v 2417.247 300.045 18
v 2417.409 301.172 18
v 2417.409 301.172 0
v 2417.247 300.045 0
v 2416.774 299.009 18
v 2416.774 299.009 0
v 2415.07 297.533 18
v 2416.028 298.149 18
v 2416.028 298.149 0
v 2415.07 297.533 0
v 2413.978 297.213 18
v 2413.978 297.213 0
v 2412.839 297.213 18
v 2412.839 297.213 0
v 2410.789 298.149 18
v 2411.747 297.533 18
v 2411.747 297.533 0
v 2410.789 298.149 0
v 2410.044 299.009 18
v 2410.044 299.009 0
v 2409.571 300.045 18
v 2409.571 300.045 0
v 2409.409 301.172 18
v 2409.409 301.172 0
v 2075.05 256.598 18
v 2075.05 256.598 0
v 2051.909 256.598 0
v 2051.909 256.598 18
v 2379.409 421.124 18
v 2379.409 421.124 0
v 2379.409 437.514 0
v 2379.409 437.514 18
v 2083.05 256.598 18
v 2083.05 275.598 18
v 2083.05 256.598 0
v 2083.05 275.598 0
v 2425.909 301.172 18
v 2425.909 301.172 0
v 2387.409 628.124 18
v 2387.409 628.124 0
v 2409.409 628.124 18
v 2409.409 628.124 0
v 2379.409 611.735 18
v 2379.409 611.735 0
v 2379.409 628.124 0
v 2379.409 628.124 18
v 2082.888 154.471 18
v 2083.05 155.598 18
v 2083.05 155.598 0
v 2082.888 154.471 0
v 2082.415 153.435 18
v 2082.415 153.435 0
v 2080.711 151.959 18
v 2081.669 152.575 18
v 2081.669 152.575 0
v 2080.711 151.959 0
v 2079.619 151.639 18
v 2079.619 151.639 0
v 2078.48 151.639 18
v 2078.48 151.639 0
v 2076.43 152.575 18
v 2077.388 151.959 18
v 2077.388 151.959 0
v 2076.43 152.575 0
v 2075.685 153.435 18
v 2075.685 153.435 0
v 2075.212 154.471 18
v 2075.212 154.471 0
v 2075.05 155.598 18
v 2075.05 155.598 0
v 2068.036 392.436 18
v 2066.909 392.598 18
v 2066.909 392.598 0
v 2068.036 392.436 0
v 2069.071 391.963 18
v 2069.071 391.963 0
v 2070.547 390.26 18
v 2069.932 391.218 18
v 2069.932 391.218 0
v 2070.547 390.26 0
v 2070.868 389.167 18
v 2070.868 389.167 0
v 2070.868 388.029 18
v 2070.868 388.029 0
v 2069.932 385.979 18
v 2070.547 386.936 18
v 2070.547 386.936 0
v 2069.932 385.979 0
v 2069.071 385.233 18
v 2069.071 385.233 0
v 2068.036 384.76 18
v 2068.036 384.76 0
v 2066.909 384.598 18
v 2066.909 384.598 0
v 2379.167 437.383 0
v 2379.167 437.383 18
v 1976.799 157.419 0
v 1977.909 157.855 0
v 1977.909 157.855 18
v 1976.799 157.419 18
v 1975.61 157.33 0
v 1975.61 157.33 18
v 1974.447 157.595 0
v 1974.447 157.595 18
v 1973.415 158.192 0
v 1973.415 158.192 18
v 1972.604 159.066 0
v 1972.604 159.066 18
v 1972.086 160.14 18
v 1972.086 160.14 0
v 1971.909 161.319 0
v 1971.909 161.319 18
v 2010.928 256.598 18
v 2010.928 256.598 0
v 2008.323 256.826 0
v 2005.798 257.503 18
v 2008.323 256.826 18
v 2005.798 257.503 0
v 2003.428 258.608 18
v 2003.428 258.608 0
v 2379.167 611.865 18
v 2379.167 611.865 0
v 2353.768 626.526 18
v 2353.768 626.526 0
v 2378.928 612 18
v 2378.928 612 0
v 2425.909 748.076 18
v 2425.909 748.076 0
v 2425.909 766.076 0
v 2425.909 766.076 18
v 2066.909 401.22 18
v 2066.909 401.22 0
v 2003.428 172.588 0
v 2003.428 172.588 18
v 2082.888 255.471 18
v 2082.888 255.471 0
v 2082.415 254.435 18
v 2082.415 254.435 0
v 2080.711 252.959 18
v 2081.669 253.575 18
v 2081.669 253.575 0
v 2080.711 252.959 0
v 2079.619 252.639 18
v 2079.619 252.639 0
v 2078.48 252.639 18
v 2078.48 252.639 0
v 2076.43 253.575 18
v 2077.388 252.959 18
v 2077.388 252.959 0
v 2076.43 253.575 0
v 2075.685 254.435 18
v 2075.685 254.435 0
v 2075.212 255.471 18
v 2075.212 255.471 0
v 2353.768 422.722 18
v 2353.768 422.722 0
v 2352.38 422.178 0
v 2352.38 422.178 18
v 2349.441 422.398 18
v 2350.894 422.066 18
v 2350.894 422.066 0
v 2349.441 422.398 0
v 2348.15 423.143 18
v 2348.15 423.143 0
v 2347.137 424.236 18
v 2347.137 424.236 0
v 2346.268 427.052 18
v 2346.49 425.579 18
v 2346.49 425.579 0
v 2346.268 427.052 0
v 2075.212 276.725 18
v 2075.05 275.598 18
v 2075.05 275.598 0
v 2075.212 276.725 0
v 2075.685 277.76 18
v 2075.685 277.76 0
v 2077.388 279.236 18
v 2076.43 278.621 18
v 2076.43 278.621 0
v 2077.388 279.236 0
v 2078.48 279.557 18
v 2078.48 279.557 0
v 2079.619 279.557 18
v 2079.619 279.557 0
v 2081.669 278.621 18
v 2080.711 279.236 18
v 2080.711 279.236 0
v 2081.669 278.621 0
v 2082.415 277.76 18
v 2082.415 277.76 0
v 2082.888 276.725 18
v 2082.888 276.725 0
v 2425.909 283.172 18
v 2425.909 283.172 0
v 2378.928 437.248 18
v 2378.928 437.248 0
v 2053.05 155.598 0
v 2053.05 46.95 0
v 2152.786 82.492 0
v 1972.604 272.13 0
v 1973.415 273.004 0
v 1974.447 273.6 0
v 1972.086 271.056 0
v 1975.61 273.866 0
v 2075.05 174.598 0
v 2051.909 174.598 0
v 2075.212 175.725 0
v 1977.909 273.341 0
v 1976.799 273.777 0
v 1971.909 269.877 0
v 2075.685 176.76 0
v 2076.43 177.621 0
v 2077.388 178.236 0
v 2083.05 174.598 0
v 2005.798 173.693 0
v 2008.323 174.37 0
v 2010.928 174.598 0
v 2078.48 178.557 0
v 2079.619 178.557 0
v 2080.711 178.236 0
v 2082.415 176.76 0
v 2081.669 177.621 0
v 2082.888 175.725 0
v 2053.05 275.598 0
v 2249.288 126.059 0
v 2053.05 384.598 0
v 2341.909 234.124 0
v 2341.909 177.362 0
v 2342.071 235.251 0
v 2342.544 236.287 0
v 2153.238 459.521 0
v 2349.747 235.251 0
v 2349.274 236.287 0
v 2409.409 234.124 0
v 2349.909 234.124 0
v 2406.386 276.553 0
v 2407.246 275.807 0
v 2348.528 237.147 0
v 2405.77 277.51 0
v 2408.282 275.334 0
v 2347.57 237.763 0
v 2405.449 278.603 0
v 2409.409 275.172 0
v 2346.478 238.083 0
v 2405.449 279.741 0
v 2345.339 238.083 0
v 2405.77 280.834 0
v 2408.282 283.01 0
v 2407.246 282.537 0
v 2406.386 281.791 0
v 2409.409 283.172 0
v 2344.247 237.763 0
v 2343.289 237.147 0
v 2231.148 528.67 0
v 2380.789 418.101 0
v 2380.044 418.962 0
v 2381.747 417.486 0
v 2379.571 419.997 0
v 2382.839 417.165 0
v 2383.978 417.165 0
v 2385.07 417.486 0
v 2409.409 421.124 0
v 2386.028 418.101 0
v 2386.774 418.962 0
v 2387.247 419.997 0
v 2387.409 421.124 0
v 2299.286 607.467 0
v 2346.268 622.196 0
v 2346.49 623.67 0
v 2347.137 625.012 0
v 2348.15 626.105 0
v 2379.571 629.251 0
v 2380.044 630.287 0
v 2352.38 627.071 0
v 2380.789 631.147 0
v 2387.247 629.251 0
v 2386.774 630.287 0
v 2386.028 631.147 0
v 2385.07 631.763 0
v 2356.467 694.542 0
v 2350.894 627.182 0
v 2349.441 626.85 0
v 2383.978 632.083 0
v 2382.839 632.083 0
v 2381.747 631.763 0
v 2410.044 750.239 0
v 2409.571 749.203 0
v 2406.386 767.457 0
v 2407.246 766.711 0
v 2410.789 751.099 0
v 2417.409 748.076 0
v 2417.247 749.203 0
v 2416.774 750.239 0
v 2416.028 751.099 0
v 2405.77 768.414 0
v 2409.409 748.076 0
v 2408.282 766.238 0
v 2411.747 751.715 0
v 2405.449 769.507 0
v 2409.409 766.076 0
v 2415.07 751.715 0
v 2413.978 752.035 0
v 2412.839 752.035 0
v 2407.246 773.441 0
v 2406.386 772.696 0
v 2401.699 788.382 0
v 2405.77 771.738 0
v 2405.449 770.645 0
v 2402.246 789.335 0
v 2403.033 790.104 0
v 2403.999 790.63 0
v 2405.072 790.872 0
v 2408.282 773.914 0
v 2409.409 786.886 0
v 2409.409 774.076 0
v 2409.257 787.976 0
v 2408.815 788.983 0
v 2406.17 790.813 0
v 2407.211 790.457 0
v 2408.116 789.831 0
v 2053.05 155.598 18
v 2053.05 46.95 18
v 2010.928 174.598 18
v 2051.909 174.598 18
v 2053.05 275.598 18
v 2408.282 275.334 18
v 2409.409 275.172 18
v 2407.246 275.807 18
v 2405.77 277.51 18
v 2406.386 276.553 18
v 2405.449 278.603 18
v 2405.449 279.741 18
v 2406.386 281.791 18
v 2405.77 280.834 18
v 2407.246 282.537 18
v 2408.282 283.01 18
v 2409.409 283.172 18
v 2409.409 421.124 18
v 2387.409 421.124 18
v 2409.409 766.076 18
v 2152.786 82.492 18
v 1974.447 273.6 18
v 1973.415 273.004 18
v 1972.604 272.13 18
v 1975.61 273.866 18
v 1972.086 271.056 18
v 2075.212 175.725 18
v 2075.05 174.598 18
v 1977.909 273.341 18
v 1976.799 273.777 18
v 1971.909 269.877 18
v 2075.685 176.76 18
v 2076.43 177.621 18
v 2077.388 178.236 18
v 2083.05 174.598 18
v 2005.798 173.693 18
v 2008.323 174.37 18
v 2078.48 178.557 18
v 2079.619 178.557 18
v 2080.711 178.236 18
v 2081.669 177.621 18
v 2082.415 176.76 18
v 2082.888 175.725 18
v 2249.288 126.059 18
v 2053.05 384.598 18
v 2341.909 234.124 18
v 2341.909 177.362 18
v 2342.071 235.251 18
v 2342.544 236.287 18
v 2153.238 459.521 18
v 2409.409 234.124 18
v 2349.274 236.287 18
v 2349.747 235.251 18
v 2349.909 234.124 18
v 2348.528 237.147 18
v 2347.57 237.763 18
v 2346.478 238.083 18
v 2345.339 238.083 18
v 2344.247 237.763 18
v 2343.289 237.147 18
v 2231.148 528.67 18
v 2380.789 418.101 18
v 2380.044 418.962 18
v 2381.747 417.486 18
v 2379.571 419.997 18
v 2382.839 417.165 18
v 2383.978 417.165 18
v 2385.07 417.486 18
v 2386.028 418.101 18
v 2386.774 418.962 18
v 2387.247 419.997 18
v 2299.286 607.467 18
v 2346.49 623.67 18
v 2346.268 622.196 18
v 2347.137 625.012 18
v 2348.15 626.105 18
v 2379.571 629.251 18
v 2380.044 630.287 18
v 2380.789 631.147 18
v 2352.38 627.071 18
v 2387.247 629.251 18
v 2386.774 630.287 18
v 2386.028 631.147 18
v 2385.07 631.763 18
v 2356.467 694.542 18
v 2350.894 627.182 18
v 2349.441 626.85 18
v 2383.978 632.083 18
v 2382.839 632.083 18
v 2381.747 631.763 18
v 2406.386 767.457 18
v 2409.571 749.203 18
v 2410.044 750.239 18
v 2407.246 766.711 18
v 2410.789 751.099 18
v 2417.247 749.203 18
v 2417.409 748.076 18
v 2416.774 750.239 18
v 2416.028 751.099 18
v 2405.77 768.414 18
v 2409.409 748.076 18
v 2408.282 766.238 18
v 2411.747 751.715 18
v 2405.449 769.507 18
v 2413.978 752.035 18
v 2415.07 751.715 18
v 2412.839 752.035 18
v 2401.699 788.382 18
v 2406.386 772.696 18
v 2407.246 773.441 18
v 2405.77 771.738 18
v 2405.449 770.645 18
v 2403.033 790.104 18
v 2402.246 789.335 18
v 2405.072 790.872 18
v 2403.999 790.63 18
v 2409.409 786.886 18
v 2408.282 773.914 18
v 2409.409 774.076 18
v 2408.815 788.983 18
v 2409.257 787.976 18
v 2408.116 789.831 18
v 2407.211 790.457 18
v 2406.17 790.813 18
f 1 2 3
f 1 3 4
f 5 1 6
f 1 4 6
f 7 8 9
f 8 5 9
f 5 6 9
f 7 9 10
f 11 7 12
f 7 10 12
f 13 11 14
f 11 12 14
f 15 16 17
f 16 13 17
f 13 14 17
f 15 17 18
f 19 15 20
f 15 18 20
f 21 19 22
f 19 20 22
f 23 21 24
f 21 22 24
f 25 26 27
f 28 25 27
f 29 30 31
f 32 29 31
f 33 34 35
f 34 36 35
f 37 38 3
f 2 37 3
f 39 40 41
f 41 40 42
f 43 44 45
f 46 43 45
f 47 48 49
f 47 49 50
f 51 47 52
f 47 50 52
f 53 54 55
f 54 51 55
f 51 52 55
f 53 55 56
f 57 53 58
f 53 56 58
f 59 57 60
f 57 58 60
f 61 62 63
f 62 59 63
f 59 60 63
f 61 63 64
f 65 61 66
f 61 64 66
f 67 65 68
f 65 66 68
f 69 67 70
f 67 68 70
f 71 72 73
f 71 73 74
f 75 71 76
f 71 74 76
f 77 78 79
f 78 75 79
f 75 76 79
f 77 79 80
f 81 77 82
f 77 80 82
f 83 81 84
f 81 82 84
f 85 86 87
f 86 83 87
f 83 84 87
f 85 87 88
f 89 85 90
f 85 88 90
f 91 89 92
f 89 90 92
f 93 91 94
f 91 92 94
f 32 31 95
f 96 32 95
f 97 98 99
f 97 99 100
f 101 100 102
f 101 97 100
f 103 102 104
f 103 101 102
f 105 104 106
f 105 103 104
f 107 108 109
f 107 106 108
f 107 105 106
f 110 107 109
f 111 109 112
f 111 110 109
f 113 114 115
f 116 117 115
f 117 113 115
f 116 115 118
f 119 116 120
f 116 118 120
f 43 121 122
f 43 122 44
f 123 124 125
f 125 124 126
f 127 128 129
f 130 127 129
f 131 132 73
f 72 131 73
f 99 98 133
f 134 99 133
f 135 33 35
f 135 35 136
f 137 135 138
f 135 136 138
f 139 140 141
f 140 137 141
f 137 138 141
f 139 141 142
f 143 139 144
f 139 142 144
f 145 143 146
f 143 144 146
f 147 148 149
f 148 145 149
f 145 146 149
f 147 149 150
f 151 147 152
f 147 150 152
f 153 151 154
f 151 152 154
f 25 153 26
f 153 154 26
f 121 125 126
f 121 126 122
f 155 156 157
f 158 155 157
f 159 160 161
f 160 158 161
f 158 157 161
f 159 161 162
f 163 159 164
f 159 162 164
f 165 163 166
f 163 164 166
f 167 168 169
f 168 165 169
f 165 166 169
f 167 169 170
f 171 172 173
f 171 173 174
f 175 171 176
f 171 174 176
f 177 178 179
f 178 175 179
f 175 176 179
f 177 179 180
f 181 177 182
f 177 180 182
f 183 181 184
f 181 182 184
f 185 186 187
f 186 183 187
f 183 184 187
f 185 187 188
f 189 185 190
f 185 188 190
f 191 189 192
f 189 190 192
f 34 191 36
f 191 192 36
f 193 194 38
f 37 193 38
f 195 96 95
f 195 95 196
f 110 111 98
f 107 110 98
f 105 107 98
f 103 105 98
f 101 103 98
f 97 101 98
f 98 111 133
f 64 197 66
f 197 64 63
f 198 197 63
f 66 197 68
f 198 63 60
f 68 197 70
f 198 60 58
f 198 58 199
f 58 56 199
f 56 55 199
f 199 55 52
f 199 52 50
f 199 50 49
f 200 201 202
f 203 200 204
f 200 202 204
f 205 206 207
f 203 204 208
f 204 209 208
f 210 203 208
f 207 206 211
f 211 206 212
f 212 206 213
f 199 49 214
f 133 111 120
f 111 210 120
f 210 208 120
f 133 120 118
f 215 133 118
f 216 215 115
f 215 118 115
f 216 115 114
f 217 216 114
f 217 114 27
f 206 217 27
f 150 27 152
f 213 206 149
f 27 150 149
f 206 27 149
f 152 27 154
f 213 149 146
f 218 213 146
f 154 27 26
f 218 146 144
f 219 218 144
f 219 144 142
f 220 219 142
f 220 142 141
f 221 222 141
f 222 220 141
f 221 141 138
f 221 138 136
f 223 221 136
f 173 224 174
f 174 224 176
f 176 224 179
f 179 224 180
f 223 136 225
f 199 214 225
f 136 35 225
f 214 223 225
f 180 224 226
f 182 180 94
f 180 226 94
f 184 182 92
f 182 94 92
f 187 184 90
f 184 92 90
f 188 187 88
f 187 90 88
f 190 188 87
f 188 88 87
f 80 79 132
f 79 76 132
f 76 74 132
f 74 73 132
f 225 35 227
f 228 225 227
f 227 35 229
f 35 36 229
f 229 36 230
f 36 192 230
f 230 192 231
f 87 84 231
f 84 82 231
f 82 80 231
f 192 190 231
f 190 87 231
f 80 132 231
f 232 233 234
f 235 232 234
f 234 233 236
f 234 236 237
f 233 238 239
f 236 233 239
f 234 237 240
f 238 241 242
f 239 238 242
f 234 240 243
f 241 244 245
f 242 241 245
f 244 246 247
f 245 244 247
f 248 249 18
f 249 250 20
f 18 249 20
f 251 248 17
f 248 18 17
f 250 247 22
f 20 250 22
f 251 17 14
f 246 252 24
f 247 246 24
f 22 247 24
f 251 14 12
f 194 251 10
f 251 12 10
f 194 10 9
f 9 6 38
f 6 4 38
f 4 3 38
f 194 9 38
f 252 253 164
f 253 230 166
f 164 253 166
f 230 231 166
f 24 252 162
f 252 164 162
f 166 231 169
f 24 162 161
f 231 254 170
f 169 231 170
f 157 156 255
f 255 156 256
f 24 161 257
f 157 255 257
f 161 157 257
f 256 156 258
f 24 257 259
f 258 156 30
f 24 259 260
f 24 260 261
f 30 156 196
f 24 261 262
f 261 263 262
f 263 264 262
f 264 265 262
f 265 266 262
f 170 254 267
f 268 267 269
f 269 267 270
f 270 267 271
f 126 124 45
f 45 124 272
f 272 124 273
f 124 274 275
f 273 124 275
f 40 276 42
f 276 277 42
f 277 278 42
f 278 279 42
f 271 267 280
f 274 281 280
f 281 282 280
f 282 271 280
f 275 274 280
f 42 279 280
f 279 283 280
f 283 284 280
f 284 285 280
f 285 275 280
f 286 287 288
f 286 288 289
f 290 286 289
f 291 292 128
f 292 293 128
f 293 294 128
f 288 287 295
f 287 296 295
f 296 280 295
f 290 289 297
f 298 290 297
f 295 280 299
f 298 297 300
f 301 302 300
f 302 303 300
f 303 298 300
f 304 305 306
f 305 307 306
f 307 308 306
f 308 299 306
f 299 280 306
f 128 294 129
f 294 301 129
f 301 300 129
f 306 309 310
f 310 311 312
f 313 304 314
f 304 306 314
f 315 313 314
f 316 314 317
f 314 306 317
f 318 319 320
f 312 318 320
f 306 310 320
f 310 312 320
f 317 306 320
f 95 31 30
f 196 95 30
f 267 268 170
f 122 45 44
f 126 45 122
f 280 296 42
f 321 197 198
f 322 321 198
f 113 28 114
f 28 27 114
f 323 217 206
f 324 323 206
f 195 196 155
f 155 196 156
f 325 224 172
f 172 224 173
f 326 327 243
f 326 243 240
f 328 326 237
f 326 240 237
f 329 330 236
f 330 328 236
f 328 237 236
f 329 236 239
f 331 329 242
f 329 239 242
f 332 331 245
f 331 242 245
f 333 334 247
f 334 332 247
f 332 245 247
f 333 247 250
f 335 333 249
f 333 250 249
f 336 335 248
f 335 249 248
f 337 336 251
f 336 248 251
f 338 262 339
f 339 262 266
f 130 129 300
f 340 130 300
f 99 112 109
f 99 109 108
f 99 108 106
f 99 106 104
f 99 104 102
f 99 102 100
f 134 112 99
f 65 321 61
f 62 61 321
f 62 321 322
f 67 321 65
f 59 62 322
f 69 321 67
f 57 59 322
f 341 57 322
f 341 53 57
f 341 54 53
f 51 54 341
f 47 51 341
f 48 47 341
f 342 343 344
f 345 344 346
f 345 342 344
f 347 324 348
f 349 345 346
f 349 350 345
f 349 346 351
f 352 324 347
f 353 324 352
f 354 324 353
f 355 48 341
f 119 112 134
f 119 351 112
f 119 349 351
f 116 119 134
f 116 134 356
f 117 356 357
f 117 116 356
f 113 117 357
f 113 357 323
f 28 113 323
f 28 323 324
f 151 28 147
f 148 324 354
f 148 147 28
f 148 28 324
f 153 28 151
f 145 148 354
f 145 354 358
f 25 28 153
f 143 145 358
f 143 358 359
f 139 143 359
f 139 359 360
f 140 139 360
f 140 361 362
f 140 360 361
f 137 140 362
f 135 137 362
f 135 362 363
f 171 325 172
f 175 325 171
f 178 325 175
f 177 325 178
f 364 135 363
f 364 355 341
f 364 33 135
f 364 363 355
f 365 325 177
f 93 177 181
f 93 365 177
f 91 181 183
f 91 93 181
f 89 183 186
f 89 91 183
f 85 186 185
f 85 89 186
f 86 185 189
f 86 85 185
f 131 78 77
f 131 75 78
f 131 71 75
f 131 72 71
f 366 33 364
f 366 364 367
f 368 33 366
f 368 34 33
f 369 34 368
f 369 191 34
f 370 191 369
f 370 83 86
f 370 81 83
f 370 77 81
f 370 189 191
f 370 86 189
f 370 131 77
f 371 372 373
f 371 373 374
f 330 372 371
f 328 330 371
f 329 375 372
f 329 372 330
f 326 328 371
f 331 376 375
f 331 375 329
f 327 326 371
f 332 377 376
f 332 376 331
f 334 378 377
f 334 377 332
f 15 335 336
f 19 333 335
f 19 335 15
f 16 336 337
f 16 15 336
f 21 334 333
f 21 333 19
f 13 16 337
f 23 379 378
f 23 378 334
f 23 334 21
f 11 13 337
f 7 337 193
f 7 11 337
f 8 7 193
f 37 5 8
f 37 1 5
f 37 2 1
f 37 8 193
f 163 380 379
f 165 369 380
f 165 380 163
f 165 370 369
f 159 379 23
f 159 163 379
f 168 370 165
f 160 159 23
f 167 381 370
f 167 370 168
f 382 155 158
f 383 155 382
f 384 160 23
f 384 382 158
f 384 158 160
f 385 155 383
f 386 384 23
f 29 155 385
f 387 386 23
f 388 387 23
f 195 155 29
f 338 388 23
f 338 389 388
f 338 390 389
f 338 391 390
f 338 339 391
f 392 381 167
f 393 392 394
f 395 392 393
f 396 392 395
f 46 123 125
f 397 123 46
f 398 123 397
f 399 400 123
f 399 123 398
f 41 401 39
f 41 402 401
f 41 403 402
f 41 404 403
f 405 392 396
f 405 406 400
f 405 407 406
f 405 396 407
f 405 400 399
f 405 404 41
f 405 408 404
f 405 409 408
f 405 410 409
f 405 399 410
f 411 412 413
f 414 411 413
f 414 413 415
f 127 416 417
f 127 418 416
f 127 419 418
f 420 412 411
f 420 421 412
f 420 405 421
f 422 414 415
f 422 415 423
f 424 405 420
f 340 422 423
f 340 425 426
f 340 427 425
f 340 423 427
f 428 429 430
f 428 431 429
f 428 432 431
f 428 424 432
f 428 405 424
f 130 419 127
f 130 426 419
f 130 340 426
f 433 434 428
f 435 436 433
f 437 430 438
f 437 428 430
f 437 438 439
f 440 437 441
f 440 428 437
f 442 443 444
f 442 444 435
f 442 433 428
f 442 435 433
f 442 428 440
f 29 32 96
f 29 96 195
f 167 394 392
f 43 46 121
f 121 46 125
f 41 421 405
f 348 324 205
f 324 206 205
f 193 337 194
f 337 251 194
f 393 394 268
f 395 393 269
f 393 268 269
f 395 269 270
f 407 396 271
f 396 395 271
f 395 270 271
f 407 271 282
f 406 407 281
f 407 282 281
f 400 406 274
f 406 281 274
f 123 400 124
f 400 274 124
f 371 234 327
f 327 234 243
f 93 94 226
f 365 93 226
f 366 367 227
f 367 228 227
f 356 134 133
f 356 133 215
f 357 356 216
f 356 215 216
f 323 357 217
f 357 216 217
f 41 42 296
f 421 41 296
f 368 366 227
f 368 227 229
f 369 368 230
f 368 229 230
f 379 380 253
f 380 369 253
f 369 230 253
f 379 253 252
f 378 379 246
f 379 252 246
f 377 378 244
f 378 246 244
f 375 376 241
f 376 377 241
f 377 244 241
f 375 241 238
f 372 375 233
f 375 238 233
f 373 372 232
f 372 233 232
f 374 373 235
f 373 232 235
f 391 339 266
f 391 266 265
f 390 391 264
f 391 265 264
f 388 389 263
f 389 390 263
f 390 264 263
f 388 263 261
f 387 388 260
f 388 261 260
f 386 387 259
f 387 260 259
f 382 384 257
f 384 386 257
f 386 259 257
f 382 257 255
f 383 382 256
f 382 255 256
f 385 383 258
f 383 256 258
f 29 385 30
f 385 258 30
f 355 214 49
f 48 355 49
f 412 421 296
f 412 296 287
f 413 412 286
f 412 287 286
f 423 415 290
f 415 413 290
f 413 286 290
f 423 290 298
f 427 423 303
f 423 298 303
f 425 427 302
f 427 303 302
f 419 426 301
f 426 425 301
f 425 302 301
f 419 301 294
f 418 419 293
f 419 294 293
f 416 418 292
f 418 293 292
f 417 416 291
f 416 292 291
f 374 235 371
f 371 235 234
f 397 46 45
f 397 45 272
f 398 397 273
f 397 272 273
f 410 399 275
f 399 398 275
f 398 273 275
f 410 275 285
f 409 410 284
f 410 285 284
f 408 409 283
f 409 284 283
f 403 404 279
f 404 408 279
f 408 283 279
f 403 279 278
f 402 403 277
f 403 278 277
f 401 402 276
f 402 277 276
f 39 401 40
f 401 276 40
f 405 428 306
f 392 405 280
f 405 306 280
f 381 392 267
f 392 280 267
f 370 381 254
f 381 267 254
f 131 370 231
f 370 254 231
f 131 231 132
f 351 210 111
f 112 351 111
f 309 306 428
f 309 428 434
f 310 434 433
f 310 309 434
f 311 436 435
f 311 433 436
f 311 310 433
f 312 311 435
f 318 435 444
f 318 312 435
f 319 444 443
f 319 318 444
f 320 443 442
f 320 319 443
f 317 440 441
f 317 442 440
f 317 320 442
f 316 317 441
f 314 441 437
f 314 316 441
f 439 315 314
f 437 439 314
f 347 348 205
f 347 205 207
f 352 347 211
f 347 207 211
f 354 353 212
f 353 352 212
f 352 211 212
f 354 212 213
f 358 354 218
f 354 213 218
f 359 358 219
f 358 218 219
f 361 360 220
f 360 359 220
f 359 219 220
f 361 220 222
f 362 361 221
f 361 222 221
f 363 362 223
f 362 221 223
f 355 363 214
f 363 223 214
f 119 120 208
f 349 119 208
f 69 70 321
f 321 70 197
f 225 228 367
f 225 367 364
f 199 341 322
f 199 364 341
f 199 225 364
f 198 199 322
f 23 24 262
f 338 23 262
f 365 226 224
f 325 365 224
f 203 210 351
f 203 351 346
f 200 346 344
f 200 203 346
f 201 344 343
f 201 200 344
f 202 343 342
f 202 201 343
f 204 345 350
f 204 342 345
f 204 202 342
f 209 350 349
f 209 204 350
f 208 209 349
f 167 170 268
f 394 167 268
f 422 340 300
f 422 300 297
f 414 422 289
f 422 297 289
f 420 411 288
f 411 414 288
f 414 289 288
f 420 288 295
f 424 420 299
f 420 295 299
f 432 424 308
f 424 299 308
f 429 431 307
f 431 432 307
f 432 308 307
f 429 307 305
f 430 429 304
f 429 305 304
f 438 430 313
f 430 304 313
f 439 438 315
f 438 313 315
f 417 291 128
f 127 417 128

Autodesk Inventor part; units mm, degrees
ref_plane "YZ Plane" through (0, 0, 0) normal (1, 0, 0) x (0, 1, 0)
ref_plane "XZ Plane" through (0, 0, 0) normal (0, 1, 0) x (-1, 0, 0)
ref_plane "XY Plane" through (0, 0, 0) normal (0, 0, 1) x (1, 0, 0)
sketch "CONTOURS" plane through (0, 0, 0) normal (0, 0, 1) x (1, 0, 0)
  line L0 (2379.4087, 421.1241) -> (2379.4087, 437.5136)
  line L1 (2083.0497, 275.5979) -> (2083.0497, 256.5979)
  arc A0 (2075.0497, 256.5979) -> (2083.0497, 256.5979) centre (2079.0497, 256.5979) ccw
  line L2 (2075.0497, 256.5979) -> (2051.9087, 256.5979)
  line L3 (2051.9087, 256.5979) -> (2010.928, 256.5979)
  arc A1 (2003.428, 258.6076) -> (2010.928, 256.5979) centre (2010.928, 271.5979) ccw
  line L4 (2003.428, 258.6076) -> (1977.9087, 273.3411)
  arc A2 (1977.9087, 273.3411) -> (1971.9087, 269.877) centre (1975.9087, 269.877) ccw
  line L5 (1971.9087, 269.877) -> (1971.9087, 161.3189)
  arc A3 (1971.9087, 161.3189) -> (1977.9087, 157.8548) centre (1975.9087, 161.3189) ccw
  line L6 (1977.9087, 157.8548) -> (2003.428, 172.5883)
  arc A4 (2010.928, 174.5979) -> (2003.428, 172.5883) centre (2010.928, 159.5979) ccw
  line L7 (2010.928, 174.5979) -> (2051.9087, 174.5979)
  line L8 (2051.9087, 174.5979) -> (2075.0497, 174.5979)
  arc A5 (2083.0497, 174.5979) -> (2075.0497, 174.5979) centre (2079.0497, 174.5979) ccw
  line L9 (2083.0497, 174.5979) -> (2083.0497, 155.5979)
  arc A6 (2075.0497, 155.5979) -> (2083.0497, 155.5979) centre (2079.0497, 155.5979) ccw
  line L10 (2075.0497, 155.5979) -> (2053.0497, 155.5979)
  line L11 (2053.0497, 155.5979) -> (2053.0497, 46.9498)
  arc A7 (2053.0497, 46.9498) -> (2341.9087, 177.362) centre (1668.415, 1284.0168) ccw
  line L12 (2341.9087, 177.362) -> (2341.9087, 234.1241)
  arc A8 (2349.9087, 234.1241) -> (2341.9087, 234.1241) centre (2345.9087, 234.1241) ccw
  line L13 (2349.9087, 234.1241) -> (2409.4087, 234.1241)
  line L14 (2409.4087, 234.1241) -> (2409.4087, 275.172)
  arc A9 (2409.4087, 283.172) -> (2409.4087, 275.172) centre (2409.4087, 279.172) ccw
  line L15 (2409.4087, 283.172) -> (2425.9087, 283.172)
  line L16 (2425.9087, 283.172) -> (2425.9087, 301.172)
  line L17 (2425.9087, 301.172) -> (2417.4087, 301.172)
  arc A10 (2409.4087, 301.172) -> (2417.4087, 301.172) centre (2413.4087, 301.172) ccw
  line L18 (2409.4087, 301.172) -> (2409.4087, 421.1241)
  line L19 (2409.4087, 421.1241) -> (2387.4087, 421.1241)
  arc A11 (2379.4087, 421.1241) -> (2387.4087, 421.1241) centre (2383.4087, 421.1241) ccw
  line L20 (2379.4087, 437.5136) -> (2379.1671, 437.3833)
  line L21 (2379.1671, 437.3833) -> (2378.928, 437.2484)
  line L22 (2378.928, 437.2484) -> (2353.7677, 422.7221)
  arc A12 (2346.2677, 427.0523) -> (2353.7677, 422.7221) centre (2351.2677, 427.0523) ccw
  line L23 (2346.2677, 427.0523) -> (2346.2677, 622.1959)
  arc A13 (2353.7677, 626.526) -> (2346.2677, 622.1959) centre (2351.2677, 622.1959) ccw
  line L24 (2353.7677, 626.526) -> (2378.928, 611.9997)
  line L25 (2378.928, 611.9997) -> (2379.1671, 611.8648)
  line L26 (2379.1671, 611.8648) -> (2379.4087, 611.7346)
  line L27 (2379.4087, 611.7346) -> (2379.4087, 628.1241)
  arc A14 (2387.4087, 628.1241) -> (2379.4087, 628.1241) centre (2383.4087, 628.1241) ccw
  line L28 (2387.4087, 628.1241) -> (2409.4087, 628.1241)
  line L29 (2409.4087, 628.1241) -> (2409.4087, 748.0761)
  arc A15 (2417.4087, 748.0761) -> (2409.4087, 748.0761) centre (2413.4087, 748.0761) ccw
  line L30 (2417.4087, 748.0761) -> (2425.9087, 748.0761)
  line L31 (2425.9087, 748.0761) -> (2425.9087, 766.0761)
  line L32 (2425.9087, 766.0761) -> (2409.4087, 766.0761)
  arc A16 (2409.4087, 774.0761) -> (2409.4087, 766.0761) centre (2409.4087, 770.0761) ccw
  line L33 (2409.4087, 774.0761) -> (2409.4087, 786.8861)
  arc A17 (2409.4087, 786.8861) -> (2401.6988, 788.3816) centre (2405.4087, 786.8861) ccw
  arc A18 (2066.9087, 401.2195) -> (2401.6988, 788.3816) centre (1668.7587, 1083.8435) ccw
  line L34 (2066.9087, 401.2195) -> (2066.9087, 392.5981)
  arc A19 (2066.9087, 384.5981) -> (2066.9087, 392.5981) centre (2066.9087, 388.5981) ccw
  line L35 (2066.9087, 384.5981) -> (2053.0497, 384.5981)
  line L36 (2053.0497, 384.5981) -> (2053.0497, 275.5979)
  line L37 (2053.0497, 275.5979) -> (2075.0497, 275.5979)
  arc A20 (2083.0497, 275.5979) -> (2075.0497, 275.5979) centre (2079.0497, 275.5979) ccw
sketch "HOLES" plane through (0, 0, 0) normal (0, 0, 1) x (1, 0, 0)
  arc A0 (2359.9087, 385.1025) -> (2355.9087, 381.1025) centre (2359.9087, 381.1025) ccw
  line L0 (2359.9087, 385.1025) -> (2389.9087, 385.1025)
  arc A1 (2393.9087, 381.1025) -> (2389.9087, 385.1025) centre (2389.9087, 381.1025) ccw
  line L1 (2393.9087, 381.1025) -> (2393.9087, 370.1025)
  arc A2 (2389.9087, 366.1025) -> (2393.9087, 370.1025) centre (2389.9087, 370.1025) ccw
  line L2 (2389.9087, 366.1025) -> (2359.9087, 366.1025)
  arc A3 (2355.9087, 370.1025) -> (2359.9087, 366.1025) centre (2359.9087, 370.1025) ccw
  line L3 (2355.9087, 370.1025) -> (2355.9087, 381.1025)
sketch "LETTERS" plane through (0, 0, 0) normal (0, 0, 1) x (1, 0, 0)
  arc A0 (2211.6565, 303.9645) -> (2200.9951, 304.2164) centre (2206.3294, 304.2452) ccw
  line L0 (2200.9964, 295.3379) -> (2200.9964, 303.7395)
  arc A1 (2200.9964, 303.7395) -> (2191.9817, 303.7395) centre (2196.489, 303.7395) ccw
  line L1 (2191.9817, 303.7395) -> (2191.9817, 295.3379)
  line L2 (2211.6565, 295.3379) -> (2211.6565, 299.2505)
  line L3 (2211.6565, 299.2505) -> (2211.6639, 304.2373)
  line L4 (2191.9817, 295.3379) -> (2211.6565, 295.3379)
extrude "Extrusion3" add sketch "CONTOURS" along normal blind 18
properties part number "Support B" material "Wood (Birch)"
